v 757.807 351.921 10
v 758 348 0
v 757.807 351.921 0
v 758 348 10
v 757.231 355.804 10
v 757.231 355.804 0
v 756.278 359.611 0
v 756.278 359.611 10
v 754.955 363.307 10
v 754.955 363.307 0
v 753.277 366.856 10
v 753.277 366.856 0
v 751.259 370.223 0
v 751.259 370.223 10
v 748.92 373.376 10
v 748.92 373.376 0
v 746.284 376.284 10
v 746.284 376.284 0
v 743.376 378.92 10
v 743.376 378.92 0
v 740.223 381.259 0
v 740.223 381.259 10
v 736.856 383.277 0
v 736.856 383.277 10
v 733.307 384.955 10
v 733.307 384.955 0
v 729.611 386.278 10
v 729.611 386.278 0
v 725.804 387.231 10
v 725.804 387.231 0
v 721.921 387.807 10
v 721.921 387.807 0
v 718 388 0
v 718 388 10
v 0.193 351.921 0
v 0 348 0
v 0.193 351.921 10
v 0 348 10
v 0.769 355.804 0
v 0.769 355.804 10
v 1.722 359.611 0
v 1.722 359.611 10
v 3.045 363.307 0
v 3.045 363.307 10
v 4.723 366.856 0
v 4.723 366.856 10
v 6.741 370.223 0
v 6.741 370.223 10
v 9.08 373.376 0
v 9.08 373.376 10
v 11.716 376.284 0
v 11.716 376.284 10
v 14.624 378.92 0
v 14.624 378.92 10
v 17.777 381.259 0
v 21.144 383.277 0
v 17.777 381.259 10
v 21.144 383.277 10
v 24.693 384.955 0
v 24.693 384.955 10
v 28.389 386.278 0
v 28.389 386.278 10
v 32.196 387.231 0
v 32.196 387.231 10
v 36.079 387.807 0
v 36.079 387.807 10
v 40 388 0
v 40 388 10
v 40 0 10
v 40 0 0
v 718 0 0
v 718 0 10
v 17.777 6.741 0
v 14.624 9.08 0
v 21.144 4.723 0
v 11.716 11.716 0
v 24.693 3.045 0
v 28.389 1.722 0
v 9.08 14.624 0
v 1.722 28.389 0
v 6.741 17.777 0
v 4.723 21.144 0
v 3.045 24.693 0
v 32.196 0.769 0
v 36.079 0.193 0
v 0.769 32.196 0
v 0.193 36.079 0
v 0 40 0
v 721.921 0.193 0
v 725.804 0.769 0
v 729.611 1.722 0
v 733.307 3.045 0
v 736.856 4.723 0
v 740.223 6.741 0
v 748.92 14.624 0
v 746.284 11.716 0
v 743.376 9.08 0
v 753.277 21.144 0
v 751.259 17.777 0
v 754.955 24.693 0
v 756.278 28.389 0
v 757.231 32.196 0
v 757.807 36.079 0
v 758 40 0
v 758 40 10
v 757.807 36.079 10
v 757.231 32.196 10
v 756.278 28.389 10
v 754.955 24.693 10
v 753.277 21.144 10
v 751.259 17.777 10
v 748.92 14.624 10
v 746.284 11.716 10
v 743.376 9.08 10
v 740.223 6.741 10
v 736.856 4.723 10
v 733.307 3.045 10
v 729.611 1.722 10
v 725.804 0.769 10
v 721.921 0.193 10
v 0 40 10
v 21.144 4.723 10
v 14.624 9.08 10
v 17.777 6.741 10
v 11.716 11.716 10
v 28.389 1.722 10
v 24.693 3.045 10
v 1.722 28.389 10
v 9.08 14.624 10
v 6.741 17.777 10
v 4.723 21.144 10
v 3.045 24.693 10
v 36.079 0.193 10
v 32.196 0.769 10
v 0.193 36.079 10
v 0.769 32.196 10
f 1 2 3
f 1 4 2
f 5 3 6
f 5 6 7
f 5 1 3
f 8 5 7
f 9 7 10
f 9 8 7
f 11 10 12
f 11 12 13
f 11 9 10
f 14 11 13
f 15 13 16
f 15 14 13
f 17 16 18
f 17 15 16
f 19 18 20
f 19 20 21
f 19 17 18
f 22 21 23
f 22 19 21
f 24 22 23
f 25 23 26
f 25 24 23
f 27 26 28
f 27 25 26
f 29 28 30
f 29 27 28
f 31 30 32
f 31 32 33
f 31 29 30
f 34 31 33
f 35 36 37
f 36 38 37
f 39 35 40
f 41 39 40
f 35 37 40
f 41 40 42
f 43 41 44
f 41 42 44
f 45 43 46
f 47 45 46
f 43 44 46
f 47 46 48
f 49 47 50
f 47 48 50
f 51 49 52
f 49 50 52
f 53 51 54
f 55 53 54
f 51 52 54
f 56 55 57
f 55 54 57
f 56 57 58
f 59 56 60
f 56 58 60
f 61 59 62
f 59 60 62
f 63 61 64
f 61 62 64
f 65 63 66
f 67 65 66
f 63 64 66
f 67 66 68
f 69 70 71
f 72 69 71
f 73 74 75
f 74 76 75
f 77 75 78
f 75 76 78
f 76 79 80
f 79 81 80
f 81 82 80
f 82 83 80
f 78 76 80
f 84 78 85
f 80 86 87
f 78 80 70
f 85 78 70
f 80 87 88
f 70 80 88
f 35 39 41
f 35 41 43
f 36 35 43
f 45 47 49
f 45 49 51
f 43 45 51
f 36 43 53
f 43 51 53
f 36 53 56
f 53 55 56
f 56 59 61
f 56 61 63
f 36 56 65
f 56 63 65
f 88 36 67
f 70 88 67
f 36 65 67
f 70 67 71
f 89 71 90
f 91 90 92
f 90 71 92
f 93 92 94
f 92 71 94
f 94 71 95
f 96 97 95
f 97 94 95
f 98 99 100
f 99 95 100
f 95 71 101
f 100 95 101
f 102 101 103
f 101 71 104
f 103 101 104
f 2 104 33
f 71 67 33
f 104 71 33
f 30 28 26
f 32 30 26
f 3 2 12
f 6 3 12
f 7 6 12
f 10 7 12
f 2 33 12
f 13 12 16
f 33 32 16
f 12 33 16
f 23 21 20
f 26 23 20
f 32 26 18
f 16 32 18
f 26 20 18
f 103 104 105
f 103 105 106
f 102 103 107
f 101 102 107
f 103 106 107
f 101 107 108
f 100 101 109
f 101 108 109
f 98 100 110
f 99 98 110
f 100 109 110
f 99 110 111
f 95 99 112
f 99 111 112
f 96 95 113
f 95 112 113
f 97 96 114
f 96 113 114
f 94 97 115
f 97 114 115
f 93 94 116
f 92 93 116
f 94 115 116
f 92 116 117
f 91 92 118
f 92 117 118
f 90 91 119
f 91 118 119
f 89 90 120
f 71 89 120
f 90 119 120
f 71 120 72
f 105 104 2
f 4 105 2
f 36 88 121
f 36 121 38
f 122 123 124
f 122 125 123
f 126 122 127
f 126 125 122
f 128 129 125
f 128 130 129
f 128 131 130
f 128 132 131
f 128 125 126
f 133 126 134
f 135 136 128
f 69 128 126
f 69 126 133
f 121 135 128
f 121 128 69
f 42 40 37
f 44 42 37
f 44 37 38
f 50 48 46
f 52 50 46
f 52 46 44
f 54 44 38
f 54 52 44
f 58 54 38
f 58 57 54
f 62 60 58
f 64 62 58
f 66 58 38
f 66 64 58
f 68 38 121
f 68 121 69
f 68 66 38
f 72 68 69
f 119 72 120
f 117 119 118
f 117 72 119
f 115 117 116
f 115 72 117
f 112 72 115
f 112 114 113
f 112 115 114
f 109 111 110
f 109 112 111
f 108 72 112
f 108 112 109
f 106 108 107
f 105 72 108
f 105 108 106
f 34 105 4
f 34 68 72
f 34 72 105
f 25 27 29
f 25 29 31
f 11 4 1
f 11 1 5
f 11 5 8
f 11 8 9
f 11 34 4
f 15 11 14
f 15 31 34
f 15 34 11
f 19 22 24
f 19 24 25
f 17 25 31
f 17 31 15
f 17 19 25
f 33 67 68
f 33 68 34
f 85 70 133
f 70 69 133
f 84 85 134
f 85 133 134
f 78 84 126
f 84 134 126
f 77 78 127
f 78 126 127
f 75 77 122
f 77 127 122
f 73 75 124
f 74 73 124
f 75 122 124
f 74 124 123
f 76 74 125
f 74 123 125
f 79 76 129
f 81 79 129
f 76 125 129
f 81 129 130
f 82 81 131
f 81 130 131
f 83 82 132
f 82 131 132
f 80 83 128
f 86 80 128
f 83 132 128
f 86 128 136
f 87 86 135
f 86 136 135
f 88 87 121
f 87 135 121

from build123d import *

# Parameters (mm, degrees)
SKETCH_1_W      = 758
SKETCH_1_H      = 388
EXTRUDE_1_DEPTH = 10
FILLET_1_R      = 40
FILLET_2_R      = 40
FILLET_3_R      = 40
FILLET_4_R      = 40


with BuildPart() as part:
    # 草图1 → 凸台-拉伸1 (new body)
    with BuildSketch(Plane.XY):
        with Locations((379, 194)):
            Rectangle(SKETCH_1_W, SKETCH_1_H)
    extrude(amount=EXTRUDE_1_DEPTH)

    # 圆角1
    fillet_1_edges = [part.edges().sort_by_distance(p)[0] for p in [
        (758, 388, 5),
    ]]
    fillet(fillet_1_edges, radius=FILLET_1_R)

    # 圆角2
    fillet_2_edges = [part.edges().sort_by_distance(p)[0] for p in [
        (758, 0, 5),
    ]]
    fillet(fillet_2_edges, radius=FILLET_2_R)

    # 圆角3
    fillet_3_edges = [part.edges().sort_by_distance(p)[0] for p in [
        (0, 0, 5),
    ]]
    fillet(fillet_3_edges, radius=FILLET_3_R)

    # 圆角4
    fillet_4_edges = [part.edges().sort_by_distance(p)[0] for p in [
        (0, 388, 5),
    ]]
    fillet(fillet_4_edges, radius=FILLET_4_R)


solid = part.part
